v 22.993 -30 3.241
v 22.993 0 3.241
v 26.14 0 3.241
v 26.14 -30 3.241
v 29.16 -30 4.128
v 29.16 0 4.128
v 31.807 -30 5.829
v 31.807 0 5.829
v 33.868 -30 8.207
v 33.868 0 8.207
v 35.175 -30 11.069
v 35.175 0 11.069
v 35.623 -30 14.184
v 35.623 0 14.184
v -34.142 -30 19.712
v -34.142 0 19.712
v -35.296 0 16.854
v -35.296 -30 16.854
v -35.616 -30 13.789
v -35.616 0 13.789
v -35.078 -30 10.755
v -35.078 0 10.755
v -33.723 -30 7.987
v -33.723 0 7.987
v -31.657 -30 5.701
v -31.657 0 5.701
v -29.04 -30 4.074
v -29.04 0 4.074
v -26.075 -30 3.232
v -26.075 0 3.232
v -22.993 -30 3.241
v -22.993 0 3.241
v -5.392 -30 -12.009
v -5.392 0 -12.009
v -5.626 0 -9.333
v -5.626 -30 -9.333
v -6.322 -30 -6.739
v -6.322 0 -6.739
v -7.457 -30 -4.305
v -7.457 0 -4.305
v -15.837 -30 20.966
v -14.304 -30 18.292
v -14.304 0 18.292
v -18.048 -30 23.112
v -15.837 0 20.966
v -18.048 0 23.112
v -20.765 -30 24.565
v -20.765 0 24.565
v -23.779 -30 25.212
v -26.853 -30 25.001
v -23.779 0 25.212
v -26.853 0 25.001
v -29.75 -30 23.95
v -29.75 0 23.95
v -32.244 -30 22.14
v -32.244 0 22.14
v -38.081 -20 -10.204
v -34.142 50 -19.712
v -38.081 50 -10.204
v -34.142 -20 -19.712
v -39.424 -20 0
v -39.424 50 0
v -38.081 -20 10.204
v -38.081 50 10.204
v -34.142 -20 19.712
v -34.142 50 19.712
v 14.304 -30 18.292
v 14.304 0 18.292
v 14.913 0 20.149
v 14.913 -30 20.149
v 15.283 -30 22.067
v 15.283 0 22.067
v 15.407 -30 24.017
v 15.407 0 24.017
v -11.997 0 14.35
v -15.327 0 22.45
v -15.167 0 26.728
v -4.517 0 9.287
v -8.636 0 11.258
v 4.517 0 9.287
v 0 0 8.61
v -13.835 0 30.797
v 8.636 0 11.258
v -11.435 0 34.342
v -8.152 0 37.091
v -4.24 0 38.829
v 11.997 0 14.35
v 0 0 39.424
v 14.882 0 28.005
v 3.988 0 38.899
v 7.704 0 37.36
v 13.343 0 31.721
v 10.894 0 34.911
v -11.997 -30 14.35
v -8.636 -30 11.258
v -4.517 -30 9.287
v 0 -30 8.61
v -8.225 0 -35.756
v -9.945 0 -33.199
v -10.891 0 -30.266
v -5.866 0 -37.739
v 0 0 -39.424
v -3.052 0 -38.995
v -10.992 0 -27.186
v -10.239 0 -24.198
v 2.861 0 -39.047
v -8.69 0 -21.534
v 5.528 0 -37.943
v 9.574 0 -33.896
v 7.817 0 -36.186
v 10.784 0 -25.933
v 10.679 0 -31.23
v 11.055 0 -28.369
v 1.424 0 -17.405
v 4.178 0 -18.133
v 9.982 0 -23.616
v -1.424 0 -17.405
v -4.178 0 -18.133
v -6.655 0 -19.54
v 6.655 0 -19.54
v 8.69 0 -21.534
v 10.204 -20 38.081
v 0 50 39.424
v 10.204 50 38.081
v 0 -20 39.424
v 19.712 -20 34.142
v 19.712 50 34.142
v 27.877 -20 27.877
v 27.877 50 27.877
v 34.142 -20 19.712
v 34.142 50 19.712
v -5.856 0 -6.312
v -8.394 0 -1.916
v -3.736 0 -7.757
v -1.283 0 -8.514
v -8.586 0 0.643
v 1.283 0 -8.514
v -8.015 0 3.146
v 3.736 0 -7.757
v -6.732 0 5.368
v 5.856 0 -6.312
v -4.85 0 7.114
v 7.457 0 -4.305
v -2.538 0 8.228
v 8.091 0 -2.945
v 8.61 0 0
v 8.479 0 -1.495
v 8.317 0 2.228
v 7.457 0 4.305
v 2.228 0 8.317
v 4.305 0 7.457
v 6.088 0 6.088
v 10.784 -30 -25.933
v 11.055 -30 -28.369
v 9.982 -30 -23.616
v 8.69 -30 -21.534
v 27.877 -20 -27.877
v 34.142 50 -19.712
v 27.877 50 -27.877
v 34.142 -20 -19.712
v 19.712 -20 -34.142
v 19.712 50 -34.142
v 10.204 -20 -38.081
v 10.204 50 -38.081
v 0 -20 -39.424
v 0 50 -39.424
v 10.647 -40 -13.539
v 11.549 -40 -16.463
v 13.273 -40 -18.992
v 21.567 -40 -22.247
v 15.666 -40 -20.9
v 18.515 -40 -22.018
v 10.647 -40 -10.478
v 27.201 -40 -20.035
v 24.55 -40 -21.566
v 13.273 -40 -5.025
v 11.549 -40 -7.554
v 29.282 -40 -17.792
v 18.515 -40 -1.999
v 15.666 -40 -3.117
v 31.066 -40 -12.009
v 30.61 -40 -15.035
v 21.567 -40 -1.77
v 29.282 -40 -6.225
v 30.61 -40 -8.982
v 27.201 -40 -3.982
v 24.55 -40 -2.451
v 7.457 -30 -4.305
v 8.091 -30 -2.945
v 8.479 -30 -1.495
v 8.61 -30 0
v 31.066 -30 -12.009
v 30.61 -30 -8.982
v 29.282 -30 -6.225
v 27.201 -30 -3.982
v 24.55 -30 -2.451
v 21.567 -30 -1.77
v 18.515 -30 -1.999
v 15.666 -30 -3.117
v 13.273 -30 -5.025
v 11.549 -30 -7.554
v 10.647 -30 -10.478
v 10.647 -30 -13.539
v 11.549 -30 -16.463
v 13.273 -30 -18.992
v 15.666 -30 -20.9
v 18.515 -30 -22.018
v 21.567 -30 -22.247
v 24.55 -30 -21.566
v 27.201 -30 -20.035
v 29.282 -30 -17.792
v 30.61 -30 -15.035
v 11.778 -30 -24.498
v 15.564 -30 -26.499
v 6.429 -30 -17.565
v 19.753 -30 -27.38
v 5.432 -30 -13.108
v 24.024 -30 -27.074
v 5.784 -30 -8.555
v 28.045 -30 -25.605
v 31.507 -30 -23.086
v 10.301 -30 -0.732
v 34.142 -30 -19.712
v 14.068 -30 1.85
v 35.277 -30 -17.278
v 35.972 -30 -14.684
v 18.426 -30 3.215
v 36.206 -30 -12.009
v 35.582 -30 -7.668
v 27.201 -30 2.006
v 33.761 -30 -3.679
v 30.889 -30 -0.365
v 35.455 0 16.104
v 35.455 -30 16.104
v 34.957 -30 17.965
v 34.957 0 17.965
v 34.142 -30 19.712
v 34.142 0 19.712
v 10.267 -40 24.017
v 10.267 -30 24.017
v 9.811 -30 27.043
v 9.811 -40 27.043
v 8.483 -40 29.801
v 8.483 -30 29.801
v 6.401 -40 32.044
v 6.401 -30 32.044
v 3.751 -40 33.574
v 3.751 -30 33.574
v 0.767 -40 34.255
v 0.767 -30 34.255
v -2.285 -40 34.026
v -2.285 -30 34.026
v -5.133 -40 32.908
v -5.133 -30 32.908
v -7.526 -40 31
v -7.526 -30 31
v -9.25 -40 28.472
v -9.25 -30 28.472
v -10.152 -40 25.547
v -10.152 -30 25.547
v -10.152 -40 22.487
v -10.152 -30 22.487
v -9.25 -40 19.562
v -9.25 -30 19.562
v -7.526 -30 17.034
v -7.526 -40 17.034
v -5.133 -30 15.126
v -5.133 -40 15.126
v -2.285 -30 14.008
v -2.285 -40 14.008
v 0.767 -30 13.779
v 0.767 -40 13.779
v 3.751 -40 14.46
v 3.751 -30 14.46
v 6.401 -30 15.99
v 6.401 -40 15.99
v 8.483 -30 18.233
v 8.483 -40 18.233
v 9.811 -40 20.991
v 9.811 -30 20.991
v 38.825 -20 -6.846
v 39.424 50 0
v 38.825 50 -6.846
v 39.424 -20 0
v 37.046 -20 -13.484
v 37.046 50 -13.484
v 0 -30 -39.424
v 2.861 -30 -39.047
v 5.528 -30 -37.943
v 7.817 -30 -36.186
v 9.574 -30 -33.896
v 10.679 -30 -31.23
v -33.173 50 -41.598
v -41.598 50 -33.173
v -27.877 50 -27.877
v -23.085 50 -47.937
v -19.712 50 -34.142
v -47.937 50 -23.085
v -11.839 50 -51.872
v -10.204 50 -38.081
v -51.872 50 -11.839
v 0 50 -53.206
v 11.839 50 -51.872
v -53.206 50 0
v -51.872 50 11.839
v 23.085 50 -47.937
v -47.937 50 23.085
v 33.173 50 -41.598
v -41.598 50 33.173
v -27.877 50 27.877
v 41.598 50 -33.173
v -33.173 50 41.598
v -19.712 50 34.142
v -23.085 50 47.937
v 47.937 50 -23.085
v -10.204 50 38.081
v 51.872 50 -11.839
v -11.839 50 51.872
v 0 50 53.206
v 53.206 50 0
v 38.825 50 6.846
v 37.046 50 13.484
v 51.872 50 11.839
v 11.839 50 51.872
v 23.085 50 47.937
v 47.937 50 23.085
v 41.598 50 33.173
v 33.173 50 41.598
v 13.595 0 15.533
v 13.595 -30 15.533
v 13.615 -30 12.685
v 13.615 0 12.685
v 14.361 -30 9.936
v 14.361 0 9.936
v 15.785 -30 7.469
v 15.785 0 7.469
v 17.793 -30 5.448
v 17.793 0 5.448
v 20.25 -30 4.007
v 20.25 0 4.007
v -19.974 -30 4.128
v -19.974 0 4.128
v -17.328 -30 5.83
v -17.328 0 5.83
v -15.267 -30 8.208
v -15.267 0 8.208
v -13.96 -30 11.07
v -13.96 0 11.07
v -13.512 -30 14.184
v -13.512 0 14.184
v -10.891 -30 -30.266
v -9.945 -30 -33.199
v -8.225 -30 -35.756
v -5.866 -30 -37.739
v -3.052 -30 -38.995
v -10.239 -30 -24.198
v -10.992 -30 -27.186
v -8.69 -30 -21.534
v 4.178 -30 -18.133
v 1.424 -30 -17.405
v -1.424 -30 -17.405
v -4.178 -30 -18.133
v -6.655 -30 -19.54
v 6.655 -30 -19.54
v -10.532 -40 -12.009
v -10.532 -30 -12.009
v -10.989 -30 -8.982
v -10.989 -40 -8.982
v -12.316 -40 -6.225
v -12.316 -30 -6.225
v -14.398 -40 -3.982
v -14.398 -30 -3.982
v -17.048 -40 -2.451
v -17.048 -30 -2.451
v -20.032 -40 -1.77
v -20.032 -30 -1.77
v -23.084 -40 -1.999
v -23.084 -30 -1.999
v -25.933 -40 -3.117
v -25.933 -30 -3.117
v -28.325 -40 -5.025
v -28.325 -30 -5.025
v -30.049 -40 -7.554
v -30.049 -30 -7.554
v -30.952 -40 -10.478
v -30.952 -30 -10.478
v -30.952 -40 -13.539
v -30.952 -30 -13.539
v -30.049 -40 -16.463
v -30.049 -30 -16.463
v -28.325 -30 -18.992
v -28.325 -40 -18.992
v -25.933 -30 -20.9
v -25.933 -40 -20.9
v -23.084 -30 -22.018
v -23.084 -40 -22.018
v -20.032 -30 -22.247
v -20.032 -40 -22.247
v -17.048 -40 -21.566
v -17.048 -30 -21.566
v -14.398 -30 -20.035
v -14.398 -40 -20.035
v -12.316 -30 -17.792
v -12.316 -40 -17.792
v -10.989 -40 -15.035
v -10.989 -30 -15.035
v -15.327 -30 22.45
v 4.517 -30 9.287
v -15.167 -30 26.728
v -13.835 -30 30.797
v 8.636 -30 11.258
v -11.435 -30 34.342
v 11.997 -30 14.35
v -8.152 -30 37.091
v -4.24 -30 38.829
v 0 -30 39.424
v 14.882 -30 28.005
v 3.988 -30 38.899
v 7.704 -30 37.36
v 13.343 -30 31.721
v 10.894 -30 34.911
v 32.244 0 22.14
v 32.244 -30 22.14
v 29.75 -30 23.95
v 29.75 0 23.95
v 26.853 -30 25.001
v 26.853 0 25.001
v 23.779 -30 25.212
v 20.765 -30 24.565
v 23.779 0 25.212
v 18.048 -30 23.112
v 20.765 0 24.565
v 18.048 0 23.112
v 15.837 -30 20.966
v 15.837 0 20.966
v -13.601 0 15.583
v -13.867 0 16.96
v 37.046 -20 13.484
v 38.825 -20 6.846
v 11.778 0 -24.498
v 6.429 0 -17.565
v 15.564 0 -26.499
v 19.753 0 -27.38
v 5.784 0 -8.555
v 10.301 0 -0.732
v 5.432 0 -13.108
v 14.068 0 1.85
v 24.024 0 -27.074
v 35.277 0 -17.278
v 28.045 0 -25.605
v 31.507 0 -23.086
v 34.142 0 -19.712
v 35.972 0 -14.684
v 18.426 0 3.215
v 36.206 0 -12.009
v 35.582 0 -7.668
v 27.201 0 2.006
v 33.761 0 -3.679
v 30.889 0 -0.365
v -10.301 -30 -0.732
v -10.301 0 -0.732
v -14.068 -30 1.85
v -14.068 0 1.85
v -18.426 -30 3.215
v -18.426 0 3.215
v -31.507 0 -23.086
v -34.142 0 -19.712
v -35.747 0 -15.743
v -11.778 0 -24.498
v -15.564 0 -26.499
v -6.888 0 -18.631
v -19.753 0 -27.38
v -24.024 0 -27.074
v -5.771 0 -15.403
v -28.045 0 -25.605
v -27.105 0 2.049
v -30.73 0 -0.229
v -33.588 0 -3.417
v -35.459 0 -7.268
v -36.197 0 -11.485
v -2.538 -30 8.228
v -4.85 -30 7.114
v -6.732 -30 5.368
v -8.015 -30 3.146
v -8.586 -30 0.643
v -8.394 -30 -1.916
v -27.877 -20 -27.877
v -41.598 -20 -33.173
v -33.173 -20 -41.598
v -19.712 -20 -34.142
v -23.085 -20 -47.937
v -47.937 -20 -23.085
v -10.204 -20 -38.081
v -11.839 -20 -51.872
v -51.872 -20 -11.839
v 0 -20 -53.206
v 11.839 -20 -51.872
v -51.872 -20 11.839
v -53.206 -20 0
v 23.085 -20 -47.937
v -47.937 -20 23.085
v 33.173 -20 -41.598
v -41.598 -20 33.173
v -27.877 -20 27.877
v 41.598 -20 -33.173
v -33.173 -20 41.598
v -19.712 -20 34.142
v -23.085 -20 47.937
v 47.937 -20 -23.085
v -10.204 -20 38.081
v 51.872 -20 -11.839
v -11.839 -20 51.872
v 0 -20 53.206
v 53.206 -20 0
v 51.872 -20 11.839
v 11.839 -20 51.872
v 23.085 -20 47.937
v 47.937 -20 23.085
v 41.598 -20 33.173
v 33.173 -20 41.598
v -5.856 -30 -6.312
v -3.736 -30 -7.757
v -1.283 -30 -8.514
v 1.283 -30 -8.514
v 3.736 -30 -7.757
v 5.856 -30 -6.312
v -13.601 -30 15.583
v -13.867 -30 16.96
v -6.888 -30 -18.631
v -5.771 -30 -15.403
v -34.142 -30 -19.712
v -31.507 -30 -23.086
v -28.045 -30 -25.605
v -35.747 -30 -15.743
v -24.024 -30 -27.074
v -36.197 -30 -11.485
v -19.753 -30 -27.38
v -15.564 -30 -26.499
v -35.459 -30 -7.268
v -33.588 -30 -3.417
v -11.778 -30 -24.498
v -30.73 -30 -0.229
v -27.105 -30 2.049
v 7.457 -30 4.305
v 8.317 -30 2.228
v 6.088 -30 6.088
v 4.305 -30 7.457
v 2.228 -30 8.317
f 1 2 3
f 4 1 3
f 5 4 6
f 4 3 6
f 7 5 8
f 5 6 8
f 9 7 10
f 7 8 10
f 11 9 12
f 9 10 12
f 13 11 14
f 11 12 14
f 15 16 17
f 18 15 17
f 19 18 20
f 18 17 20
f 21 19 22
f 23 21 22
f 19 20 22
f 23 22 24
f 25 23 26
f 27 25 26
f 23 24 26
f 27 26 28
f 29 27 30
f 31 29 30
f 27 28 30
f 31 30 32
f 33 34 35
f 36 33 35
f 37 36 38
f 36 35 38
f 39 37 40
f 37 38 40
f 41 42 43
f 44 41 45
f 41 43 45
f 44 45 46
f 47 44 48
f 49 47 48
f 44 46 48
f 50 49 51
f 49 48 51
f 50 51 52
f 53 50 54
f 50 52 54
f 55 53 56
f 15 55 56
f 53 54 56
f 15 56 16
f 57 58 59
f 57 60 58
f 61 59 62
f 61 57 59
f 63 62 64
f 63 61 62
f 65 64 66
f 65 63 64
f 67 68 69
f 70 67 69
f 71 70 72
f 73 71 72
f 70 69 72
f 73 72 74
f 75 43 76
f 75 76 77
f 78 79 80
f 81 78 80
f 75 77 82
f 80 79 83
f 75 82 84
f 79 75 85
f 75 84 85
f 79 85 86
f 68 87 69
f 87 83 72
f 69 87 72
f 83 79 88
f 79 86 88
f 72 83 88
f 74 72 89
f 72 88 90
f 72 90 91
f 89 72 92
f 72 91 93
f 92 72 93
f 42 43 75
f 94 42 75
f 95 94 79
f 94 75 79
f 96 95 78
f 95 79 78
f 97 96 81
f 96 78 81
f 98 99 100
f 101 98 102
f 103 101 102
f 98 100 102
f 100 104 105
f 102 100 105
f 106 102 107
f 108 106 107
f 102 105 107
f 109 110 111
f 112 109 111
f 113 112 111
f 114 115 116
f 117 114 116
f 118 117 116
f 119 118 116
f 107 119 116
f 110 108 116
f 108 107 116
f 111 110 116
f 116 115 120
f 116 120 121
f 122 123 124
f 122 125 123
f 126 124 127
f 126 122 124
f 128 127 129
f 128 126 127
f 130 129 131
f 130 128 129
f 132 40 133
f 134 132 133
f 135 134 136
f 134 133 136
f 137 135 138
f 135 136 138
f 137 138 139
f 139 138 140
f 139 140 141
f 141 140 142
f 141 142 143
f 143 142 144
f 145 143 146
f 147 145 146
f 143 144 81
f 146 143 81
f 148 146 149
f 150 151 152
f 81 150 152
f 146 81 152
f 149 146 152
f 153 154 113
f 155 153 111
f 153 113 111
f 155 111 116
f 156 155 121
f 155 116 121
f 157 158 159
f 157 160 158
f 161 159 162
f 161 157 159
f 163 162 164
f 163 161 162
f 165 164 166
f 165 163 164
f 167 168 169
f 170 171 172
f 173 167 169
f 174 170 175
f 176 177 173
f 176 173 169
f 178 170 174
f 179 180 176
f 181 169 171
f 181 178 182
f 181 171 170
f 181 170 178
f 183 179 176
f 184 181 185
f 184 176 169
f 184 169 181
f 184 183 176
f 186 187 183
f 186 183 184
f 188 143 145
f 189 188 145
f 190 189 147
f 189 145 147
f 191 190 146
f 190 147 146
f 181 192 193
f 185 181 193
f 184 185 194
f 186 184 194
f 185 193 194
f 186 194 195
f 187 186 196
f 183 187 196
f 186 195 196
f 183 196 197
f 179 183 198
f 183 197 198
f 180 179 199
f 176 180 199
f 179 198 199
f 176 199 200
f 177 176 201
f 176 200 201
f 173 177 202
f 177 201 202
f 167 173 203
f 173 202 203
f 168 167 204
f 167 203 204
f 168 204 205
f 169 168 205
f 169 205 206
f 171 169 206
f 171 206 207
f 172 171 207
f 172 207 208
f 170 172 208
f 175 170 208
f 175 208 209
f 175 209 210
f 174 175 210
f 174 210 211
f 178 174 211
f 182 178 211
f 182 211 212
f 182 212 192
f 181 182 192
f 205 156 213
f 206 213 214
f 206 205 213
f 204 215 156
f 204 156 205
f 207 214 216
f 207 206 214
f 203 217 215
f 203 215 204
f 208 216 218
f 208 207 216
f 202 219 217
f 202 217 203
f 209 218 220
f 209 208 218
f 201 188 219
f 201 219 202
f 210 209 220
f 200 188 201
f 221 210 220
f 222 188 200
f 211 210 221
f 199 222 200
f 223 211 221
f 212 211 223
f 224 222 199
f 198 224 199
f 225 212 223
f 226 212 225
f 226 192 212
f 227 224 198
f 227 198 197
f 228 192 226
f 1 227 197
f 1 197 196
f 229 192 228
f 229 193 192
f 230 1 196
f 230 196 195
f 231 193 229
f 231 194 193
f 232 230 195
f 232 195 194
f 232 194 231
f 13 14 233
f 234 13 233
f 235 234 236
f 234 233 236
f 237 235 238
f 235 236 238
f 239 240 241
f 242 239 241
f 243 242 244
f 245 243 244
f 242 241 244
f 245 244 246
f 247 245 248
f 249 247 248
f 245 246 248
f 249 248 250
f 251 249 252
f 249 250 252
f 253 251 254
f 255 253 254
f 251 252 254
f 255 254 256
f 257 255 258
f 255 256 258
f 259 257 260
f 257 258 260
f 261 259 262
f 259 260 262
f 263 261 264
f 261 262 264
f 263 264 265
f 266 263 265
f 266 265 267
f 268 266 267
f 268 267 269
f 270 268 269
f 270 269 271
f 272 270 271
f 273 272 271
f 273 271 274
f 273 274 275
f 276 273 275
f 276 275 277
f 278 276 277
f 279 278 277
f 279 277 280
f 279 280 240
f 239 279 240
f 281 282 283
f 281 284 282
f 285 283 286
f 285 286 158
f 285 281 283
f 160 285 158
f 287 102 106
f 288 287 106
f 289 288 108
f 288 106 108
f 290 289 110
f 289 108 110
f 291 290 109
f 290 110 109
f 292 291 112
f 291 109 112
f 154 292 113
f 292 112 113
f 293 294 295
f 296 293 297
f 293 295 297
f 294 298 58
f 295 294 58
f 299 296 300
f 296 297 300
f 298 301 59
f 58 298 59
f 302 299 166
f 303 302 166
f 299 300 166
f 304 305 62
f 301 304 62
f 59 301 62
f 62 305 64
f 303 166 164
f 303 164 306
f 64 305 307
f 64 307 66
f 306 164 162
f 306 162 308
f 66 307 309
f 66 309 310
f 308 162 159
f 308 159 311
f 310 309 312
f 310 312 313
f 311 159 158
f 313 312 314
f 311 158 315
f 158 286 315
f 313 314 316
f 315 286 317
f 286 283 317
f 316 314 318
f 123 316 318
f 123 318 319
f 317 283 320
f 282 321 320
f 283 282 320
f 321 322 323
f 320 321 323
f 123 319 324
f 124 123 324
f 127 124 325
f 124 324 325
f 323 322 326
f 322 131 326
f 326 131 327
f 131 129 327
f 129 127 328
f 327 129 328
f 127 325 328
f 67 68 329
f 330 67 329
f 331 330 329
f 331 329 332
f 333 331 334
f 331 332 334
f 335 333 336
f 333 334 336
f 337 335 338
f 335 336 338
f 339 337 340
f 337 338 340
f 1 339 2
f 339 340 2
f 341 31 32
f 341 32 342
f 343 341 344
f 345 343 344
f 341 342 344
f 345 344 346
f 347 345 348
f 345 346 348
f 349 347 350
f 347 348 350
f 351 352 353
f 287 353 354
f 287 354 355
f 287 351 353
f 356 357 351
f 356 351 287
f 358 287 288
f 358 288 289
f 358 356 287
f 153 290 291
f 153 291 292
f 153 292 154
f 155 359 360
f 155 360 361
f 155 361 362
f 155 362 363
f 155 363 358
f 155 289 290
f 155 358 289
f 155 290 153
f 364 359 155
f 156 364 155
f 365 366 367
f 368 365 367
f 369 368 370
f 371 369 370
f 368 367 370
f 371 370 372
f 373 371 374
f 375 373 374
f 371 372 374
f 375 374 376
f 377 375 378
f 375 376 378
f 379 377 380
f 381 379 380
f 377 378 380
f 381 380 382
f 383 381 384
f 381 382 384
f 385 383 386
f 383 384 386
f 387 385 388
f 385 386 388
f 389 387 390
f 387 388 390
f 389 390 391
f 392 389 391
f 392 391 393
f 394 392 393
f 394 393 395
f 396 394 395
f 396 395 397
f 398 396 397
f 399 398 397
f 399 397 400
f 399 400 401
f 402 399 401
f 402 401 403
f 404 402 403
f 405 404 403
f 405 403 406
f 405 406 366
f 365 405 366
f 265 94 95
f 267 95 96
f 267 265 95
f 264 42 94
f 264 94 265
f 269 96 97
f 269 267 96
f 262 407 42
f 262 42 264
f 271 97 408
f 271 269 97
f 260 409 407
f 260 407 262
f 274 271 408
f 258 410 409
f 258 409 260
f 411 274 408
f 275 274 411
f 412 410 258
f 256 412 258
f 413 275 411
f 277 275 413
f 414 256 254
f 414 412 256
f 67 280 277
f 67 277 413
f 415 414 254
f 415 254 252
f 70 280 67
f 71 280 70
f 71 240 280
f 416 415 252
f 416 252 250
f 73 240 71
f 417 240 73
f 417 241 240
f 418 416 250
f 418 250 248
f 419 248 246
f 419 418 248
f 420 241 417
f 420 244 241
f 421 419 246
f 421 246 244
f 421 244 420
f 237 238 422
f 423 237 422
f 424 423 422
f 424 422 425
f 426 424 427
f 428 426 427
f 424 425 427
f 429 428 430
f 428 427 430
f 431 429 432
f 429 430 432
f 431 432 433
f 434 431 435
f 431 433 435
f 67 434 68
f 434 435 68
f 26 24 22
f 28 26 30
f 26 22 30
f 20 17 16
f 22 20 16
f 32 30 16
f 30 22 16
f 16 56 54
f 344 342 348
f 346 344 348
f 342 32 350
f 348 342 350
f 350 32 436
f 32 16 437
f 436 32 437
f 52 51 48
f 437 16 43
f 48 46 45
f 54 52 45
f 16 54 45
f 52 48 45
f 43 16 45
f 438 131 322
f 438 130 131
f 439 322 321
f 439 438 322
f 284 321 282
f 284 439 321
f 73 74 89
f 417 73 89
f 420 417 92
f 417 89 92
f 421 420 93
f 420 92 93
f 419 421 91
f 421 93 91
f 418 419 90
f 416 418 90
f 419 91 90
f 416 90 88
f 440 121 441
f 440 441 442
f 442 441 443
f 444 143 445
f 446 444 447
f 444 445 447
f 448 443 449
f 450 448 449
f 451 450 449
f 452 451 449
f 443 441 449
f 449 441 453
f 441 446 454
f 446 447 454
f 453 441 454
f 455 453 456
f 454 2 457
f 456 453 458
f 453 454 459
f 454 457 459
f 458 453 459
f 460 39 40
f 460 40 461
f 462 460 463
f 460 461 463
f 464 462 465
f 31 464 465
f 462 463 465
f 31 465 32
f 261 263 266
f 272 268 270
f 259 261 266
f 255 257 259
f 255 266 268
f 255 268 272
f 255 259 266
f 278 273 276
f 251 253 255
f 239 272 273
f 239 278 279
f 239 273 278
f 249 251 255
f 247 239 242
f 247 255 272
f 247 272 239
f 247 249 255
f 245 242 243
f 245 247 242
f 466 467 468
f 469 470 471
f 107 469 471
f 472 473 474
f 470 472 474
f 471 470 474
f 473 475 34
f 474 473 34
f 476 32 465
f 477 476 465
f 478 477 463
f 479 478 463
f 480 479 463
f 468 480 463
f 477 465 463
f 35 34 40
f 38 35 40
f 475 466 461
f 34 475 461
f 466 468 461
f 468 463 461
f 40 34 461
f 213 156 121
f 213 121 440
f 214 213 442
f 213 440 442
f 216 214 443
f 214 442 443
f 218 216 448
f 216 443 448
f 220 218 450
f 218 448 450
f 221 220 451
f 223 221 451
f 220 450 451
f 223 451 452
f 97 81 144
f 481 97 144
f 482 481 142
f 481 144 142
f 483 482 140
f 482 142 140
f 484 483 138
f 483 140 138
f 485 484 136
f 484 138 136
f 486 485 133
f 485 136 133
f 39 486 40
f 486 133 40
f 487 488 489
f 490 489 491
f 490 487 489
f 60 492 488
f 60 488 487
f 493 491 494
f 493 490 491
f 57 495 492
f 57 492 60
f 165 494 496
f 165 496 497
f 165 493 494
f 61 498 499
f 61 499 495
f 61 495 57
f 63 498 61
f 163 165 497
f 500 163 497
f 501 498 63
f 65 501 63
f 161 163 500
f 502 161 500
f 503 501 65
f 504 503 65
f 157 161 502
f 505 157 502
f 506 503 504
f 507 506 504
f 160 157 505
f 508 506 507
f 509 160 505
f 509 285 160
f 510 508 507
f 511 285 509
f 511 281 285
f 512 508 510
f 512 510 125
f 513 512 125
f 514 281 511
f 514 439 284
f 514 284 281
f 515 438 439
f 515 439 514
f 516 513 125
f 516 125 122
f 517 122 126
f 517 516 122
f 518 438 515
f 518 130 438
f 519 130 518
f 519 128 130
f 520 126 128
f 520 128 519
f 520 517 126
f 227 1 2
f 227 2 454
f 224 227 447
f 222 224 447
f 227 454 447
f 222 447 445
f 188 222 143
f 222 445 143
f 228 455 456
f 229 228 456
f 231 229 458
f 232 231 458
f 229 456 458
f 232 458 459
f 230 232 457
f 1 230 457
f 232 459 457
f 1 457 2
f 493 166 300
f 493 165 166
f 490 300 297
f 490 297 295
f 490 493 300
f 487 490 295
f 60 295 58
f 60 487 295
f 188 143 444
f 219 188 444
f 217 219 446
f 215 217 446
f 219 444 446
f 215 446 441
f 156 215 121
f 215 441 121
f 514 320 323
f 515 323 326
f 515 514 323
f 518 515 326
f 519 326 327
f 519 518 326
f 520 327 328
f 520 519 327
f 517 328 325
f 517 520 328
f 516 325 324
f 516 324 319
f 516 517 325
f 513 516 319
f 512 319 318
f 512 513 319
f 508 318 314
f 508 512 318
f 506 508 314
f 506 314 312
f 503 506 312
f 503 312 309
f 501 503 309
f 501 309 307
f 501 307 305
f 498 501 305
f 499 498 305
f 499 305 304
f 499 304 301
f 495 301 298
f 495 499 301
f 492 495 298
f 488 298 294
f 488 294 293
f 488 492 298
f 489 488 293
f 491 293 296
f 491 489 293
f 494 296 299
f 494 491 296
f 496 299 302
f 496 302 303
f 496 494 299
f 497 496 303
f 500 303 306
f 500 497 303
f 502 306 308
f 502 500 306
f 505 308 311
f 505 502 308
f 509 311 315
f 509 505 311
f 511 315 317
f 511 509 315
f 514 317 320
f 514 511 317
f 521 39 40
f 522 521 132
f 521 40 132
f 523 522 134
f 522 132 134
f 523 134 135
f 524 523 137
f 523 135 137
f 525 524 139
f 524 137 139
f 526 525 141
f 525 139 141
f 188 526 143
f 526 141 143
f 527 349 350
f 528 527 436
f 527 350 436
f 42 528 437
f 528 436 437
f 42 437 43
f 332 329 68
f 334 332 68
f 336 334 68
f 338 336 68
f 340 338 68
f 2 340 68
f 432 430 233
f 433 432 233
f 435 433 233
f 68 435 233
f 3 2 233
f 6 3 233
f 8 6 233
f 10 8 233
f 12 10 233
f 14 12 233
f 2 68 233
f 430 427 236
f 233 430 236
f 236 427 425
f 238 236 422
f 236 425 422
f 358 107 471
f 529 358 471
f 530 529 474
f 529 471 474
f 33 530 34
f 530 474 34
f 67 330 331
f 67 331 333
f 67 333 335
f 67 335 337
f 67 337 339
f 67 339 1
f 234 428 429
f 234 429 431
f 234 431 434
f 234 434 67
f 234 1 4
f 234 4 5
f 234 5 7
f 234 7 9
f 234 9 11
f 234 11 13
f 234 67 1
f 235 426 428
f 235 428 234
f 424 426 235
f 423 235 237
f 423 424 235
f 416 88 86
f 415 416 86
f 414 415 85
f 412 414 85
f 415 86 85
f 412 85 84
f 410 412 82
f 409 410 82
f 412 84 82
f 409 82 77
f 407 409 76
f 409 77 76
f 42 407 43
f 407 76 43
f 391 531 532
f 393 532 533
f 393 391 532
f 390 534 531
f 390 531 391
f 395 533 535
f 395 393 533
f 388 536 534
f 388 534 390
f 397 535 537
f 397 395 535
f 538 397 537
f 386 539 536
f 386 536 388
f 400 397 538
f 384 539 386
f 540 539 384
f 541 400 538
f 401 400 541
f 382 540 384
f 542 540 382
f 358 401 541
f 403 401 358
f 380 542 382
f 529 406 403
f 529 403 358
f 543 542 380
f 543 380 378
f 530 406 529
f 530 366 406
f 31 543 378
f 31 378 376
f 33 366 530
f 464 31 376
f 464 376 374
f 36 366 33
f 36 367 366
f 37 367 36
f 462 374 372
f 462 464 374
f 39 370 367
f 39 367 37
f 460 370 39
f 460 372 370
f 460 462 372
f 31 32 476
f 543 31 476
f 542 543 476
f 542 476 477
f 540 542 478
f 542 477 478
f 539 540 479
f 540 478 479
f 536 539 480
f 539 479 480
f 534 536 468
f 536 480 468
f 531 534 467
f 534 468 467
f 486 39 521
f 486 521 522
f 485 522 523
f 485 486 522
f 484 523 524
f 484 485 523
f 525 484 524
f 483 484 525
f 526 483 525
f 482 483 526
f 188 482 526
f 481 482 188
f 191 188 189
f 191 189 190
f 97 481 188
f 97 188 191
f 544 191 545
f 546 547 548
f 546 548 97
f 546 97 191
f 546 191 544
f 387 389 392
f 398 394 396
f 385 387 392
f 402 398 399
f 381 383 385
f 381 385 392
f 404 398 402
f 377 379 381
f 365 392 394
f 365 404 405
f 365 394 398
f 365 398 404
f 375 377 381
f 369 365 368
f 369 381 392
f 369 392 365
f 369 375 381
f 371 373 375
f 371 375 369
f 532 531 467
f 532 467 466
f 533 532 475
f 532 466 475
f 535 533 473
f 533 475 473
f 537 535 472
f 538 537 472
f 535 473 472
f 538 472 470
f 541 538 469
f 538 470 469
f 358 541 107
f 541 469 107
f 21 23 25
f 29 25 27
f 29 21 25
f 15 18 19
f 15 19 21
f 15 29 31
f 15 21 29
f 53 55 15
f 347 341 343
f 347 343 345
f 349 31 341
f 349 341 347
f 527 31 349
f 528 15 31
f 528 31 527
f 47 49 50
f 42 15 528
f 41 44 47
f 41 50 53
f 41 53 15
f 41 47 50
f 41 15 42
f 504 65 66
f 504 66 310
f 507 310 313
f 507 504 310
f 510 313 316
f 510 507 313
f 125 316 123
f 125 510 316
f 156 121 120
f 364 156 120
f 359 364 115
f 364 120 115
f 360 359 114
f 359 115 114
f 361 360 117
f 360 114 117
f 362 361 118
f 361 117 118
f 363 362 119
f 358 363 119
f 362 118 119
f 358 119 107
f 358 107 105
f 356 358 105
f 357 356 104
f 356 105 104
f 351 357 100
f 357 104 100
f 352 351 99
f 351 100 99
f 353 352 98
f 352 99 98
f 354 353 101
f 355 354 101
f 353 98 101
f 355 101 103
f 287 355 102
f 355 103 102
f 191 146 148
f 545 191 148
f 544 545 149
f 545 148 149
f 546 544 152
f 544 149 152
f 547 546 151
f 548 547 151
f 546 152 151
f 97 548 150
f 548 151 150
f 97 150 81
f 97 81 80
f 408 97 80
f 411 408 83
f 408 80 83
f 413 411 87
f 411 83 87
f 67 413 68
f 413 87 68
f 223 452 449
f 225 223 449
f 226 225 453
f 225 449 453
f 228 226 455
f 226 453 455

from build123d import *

# Parameters (mm, degrees)
F0_R           = 10.26686
F1_DEPTH       = 40
F2_DEPTH       = 30
F3_DEPTH       = 30
F4_DEPTH       = 40
F5_DEPTH       = 30
F6_DEPTH       = 40
F7_DEPTH       = 30
F8_DEPTH       = 30
F9_DEPTH       = 30
F10_DEPTH      = 30
F0_R_2         = 53.205664
F11_DEPTH      = 20
F11_DEPTH_BACK = 50


with BuildPart() as f1:
    # F0 (on Front) → F1 (new body)
    with BuildSketch(Plane.XZ):
        with Locations((0, 24.017028)):
            Circle(F0_R)
    extrude(amount=F1_DEPTH)

    # F0 (on Front) → F2 (join)
    with BuildSketch(Plane.XZ):
        with BuildLine():
            ThreePointArc((-14.303915, 18.292196), (-8.636353, 11.258146), (0, 8.610027))
            ThreePointArc((0, 8.610027), (8.636353, 11.258146), (14.303915, 18.292196))
            ThreePointArc((14.303915, 18.292196), (15.128716, 21.101959), (15.407001, 24.017028))
            ThreePointArc((15.407001, 24.017028), (10.894395, 34.911423), (0, 39.424029))
            ThreePointArc((0, 39.424029), (-12.758883, 32.653381), (-14.303915, 18.292196))
        make_face()
        with Locations((0, 24.017028)):
            Circle(F0_R, mode=Mode.SUBTRACT)
    extrude(amount=F2_DEPTH)


with BuildPart() as f3:
    # F0 (on Front) → F3 (new body)
    with BuildSketch(Plane.XZ):
        with BuildLine():
            ThreePointArc((-5.392356, -12.008514), (-5.917336, -8.020889), (-7.456503, -4.305013))
            ThreePointArc((-7.456503, -4.305013), (-14.068017, 1.850228), (-22.993464, 3.241456))
            ThreePointArc((-22.993464, 3.241456), (-34.658099, -5.277174), (-34.142211, -19.712014))
            ThreePointArc((-34.142211, -19.712014), (-21.899216, -27.376207), (-8.689549, -21.533652))
            ThreePointArc((-8.689549, -21.533652), (-6.23997, -17.048349), (-5.392356, -12.008514))
        make_face()
        with Locations((-20.799357, -12.008514)):
            Circle(F0_R, mode=Mode.SUBTRACT)
    extrude(amount=F3_DEPTH)

    # F0 (on Front) → F4 (join)
    with BuildSketch(Plane.XZ):
        with Locations((-20.799357, -12.008514)):
            Circle(F0_R)
    extrude(amount=F4_DEPTH)


with BuildPart() as f5:
    # F0 (on Front) → F5 (new body)
    with BuildSketch(Plane.XZ):
        with BuildLine():
            ThreePointArc((22.993463, 3.241456), (14.068016, 1.850228), (7.456502, -4.305013))
            ThreePointArc((7.456502, -4.305013), (5.431664, -13.108374), (8.689549, -21.533651))
            ThreePointArc((8.689549, -21.533651), (21.899216, -27.376207), (34.142211, -19.712015))
            ThreePointArc((34.142211, -19.712015), (35.681377, -15.996139), (36.206358, -12.008514))
            ThreePointArc((36.206358, -12.008514), (32.443675, -1.919632), (22.993463, 3.241456))
        make_face()
        with Locations((20.799357, -12.008514)):
            Circle(F0_R, mode=Mode.SUBTRACT)
    extrude(amount=F5_DEPTH)

    # F0 (on Front) → F6 (join)
    with BuildSketch(Plane.XZ):
        with Locations((20.799357, -12.008514)):
            Circle(F0_R)
    extrude(amount=F6_DEPTH)


with BuildPart() as f7:
    # F0 (on Front) → F7 (new body)
    with BuildSketch(Plane.XZ):
        with BuildLine():
            ThreePointArc((-13.512381, 14.184268), (-13.712068, 16.276014), (-14.303915, 18.292196))
            ThreePointArc((-14.303915, 18.292196), (-23.778655, 25.211555), (-34.142211, 19.712014))
            ThreePointArc((-34.142211, 19.712014), (-33.723175, 7.987142), (-22.993464, 3.241456))
            ThreePointArc((-22.993464, 3.241456), (-16.212342, 6.944861), (-13.512381, 14.184268))
        make_face()
    extrude(amount=F7_DEPTH)


with BuildPart() as f8:
    # F0 (on Front) → F8 (new body)
    with BuildSketch(Plane.XZ):
        with BuildLine():
            ThreePointArc((34.142211, 19.712015), (23.778655, 25.211555), (14.303915, 18.292196))
            ThreePointArc((14.303915, 18.292196), (14.993536, 8.656522), (22.993463, 3.241456))
            ThreePointArc((22.993463, 3.241456), (31.807281, 5.828737), (35.623366, 14.184268))
            ThreePointArc((35.623366, 14.184268), (35.246659, 17.04564), (34.142211, 19.712015))
        make_face()
    extrude(amount=F8_DEPTH)


with BuildPart() as f9:
    # F0 (on Front) → F9 (new body)
    with BuildSketch(Plane.XZ):
        with BuildLine():
            ThreePointArc((11.055493, -28.368537), (10.447276, -24.752138), (8.689549, -21.533651))
            ThreePointArc((8.689549, -21.533651), (0, -17.313044), (-8.689549, -21.533652))
            ThreePointArc((-8.689549, -21.533652), (-9.94452, -33.198697), (0, -39.424029))
            ThreePointArc((0, -39.424029), (7.817414, -36.18595), (11.055493, -28.368537))
        make_face()
    extrude(amount=F9_DEPTH)


with BuildPart() as f10:
    # F0 (on Front) → F10 (new body)
    with BuildSketch(Plane.XZ):
        with BuildLine():
            ThreePointArc((7.456502, -4.305013), (8.316648, -2.228439), (8.610027, 0))
            ThreePointArc((8.610027, 0), (6.088209, 6.088209), (0, 8.610027))
            ThreePointArc((0, 8.610027), (-7.456502, 4.305014), (-7.456503, -4.305013))
            ThreePointArc((-7.456503, -4.305013), (0, -8.610027), (7.456502, -4.305013))
        make_face()
    extrude(amount=F10_DEPTH)


with BuildPart() as f11:
    # F0 (on Front) → F11 (new body, two sides)
    with BuildSketch(Plane.XZ) as f11_sk:
        Circle(F0_R_2)
        with BuildLine():
            ThreePointArc((-34.142211, 19.712014), (-19.712015, 34.142211), (0, 39.424029))
            ThreePointArc((0, 39.424029), (19.712015, 34.142211), (34.142211, 19.712015))
            ThreePointArc((34.142211, 19.712015), (38.080688, 10.20369), (39.424029, 0))
            ThreePointArc((39.424029, 0), (38.080688, -10.20369), (34.142211, -19.712015))
            ThreePointArc((34.142211, -19.712015), (19.712015, -34.142211), (0, -39.424029))
            ThreePointArc((0, -39.424029), (-19.712015, -34.142211), (-34.142211, -19.712014))
            ThreePointArc((-34.142211, -19.712014), (-39.424029, 0), (-34.142211, 19.712014))
        make_face(mode=Mode.SUBTRACT)
    extrude(amount=F11_DEPTH)
    extrude(f11_sk.sketch, amount=-F11_DEPTH_BACK)


solid = Compound([f1.part, f3.part, f5.part, f7.part, f8.part, f9.part, f10.part, f11.part])
